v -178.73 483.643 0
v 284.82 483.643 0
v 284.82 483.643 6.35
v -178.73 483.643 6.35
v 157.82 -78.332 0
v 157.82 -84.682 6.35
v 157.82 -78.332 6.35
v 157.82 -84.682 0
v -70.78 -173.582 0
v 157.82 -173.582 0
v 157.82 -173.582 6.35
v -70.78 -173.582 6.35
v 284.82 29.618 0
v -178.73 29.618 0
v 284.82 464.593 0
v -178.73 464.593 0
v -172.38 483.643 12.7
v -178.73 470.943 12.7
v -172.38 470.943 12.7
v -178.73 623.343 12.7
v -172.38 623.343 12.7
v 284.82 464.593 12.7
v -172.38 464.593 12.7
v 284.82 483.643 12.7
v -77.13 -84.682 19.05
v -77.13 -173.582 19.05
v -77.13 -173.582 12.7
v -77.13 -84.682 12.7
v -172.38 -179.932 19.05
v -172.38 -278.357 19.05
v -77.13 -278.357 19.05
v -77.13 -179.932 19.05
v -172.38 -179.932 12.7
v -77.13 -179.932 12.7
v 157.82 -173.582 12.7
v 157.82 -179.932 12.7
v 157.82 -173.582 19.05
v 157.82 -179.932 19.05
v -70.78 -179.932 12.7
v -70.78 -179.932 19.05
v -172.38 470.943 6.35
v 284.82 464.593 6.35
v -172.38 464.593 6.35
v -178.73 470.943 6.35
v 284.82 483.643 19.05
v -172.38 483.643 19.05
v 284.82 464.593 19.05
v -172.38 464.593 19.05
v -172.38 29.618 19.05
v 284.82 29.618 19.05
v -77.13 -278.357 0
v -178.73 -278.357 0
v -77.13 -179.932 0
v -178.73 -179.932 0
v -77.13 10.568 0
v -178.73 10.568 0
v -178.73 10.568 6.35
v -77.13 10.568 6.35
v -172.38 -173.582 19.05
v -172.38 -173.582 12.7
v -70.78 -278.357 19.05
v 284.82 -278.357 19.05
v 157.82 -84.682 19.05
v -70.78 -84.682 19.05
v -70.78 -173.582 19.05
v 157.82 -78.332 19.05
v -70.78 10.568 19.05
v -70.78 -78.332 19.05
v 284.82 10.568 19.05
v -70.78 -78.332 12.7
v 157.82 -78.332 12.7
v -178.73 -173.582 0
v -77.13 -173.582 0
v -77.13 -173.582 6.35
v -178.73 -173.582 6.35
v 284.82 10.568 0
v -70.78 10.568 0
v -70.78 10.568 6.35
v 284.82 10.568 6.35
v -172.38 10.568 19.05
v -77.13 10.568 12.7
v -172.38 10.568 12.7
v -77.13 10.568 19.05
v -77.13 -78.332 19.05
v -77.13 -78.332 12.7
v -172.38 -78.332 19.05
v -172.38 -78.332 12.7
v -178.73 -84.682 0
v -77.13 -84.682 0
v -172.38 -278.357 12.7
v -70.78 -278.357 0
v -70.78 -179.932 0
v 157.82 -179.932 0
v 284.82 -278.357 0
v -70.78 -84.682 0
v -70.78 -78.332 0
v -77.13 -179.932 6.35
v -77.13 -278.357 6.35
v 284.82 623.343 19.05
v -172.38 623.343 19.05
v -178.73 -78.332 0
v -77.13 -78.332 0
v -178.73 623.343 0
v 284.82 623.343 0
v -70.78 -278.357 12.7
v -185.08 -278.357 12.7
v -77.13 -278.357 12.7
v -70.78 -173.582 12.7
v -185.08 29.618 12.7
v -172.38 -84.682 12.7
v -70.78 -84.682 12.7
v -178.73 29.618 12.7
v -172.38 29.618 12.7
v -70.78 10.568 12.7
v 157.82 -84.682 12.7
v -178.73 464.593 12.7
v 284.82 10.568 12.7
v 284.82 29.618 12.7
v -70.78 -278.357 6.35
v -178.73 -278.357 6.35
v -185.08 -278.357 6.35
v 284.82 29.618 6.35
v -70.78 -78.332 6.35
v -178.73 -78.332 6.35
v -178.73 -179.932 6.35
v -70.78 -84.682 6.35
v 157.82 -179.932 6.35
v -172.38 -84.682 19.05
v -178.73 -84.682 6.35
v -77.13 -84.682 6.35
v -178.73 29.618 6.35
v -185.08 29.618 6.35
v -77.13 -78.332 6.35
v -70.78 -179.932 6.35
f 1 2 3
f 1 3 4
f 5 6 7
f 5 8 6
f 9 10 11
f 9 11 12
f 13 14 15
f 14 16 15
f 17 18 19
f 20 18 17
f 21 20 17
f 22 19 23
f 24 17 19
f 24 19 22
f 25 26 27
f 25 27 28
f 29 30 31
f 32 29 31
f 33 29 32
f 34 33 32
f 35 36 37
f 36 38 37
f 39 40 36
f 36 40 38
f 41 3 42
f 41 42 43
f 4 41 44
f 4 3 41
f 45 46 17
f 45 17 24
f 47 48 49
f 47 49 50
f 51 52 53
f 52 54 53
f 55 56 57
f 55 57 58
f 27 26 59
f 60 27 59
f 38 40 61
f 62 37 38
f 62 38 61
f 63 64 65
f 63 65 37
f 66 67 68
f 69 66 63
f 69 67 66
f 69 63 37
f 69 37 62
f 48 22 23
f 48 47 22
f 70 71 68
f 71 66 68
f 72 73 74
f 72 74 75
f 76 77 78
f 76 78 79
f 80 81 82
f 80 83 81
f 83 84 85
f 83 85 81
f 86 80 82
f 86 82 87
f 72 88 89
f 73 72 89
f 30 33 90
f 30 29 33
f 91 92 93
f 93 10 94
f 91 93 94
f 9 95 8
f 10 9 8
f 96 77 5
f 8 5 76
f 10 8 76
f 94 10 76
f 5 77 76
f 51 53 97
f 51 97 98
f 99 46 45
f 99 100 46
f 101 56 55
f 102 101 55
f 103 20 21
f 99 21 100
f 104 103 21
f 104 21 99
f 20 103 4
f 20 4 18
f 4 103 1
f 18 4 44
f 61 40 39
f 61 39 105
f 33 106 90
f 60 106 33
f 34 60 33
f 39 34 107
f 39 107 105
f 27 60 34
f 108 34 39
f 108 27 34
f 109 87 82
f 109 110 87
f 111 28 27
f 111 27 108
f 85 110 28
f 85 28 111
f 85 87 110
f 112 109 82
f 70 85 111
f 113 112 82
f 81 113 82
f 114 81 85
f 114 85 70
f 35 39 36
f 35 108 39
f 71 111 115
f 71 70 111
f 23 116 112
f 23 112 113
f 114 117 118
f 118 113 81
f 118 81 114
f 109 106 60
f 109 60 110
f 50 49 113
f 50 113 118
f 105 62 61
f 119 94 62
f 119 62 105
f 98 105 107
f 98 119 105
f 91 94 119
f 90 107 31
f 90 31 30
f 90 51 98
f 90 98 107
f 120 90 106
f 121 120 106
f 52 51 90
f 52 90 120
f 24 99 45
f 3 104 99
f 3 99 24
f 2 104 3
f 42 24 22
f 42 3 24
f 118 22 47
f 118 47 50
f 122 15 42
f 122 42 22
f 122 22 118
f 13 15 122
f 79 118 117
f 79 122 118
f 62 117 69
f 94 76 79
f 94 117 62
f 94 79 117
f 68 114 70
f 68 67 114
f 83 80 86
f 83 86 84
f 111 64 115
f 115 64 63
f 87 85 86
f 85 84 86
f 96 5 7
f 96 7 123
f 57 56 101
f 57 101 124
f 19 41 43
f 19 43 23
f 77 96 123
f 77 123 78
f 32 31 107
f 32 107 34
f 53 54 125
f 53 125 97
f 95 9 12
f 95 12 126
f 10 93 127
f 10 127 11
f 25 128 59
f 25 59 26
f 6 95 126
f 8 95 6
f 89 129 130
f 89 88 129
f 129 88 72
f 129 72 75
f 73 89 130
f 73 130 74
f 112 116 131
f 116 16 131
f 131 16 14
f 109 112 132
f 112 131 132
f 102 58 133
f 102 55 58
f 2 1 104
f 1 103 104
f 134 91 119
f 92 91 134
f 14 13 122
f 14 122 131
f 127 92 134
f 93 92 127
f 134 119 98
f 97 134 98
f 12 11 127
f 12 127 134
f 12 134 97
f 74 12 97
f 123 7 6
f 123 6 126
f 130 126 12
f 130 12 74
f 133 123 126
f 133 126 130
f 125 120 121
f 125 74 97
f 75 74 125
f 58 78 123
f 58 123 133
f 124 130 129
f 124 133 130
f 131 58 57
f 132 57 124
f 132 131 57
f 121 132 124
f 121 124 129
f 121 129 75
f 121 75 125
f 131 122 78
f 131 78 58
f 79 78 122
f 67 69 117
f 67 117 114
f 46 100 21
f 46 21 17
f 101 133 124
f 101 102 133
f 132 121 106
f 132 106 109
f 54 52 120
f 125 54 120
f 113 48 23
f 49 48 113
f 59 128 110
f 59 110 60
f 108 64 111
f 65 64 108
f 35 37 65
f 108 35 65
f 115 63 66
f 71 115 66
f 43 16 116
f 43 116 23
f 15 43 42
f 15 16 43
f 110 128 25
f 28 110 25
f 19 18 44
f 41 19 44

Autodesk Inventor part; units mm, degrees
ref_plane "YZ Plane" through (0, 0, 0) normal (1, 0, 0) x (0, 1, 0)
ref_plane "XZ Plane" through (0, 0, 0) normal (0, 1, 0) x (-1, 0, 0)
ref_plane "XY Plane" through (0, 0, 0) normal (0, 0, 1) x (1, 0, 0)
sketch "Sketch1" plane through (0, 0, 0) normal (0, 0, 1) x (1, 0, 0)
  line L0 (-185.0798, 623.3432) -> (284.8202, 623.3432)
  line L1 (284.8202, 623.3432) -> (284.8202, -278.3568)
  line L2 (284.8202, -278.3568) -> (-185.0798, -278.3568)
  line L3 (-185.0798, -278.3568) -> (-185.0798, 623.3432)
  point P0 (0, 0)
  dimension "d0" = 901.7
  dimension "d1" = 469.9
extrude "Board" add sketch "Sketch1" along normal blind 19.05
sketch "Sketch6" plane through (0, 0, 0) normal (0, 0, -1) x (-1, 0, 0)
  line L0 (-284.8202, 483.6432) -> (185.0798, 483.6432)
  line L1 (185.0798, 483.6432) -> (185.0798, 464.5932)
  line L2 (185.0798, 464.5932) -> (-284.8202, 464.5932)
  line L3 (-284.8202, 464.5932) -> (-284.8202, 483.6432)
  line L4 (185.0798, 623.3432) -> (-284.8202, 623.3432) projected
  line L5 (185.0798, -278.3568) -> (185.0798, 623.3432) projected
  line L6 (-284.8202, 623.3432) -> (-284.8202, -278.3568) projected
  line L7 (-284.8202, 29.6182) -> (185.0798, 29.6182)
  line L8 (185.0798, 29.6182) -> (185.0798, 10.5682)
  line L9 (185.0798, 10.5682) -> (-284.8202, 10.5682)
  line L10 (-284.8202, 10.5682) -> (-284.8202, 29.6182)
  point P0 (0, 0)
  dimension "d30" = 19.05
  dimension "d37" = 434.975
  dimension "d119" = 139.7
extrude "Right Shelf Dados" cut sketch "Sketch6" against normal blind 6.35 contours L0 L1 L2 L3 | L7 L5 L9 L6
sketch "Sketch32" plane through (0, 0, 0) normal (0, 0, -1) x (-1, 0, 0)
  line L0 (-157.8202, -78.3318) -> (185.0798, -78.3318)
  line L1 (185.0798, -78.3318) -> (185.0798, -84.6818)
  line L2 (185.0798, -84.6818) -> (-157.8202, -84.6818)
  line L3 (-157.8202, -84.6818) -> (-157.8202, -78.3318)
  line L4 (-157.8202, -173.5818) -> (185.0798, -173.5818)
  line L5 (185.0798, -173.5818) -> (185.0798, -179.9318)
  line L6 (185.0798, -179.9318) -> (-157.8202, -179.9318)
  line L7 (-157.8202, -179.9318) -> (-157.8202, -173.5818)
  line L8 (-284.8202, 623.3432) -> (-284.8202, -278.3568) projected
  line L9 (185.0798, 623.3432) -> (185.0798, -278.3568) projected
  line L10 (-284.8202, -278.3568) -> (185.0798, -278.3568) projected
  point P0 (0, 0)
  point P1 (-284.8202, 10.5682)
  dimension "d142" = 88.9
  dimension "d143" = 6.35
  dimension "d146" = 342.9
  dimension "d167" = 127
  dimension "d170" = 98.425
extrude "Right Wine Rack Horizonal Dados" cut sketch "Sketch32" against normal blind 6.35
sketch "Sketch33" plane through (0, 0, 0) normal (0, 0, -1) x (-1, 0, 0)
  line L0 (185.0798, 10.5682) -> (-284.8202, 10.5682) projected
  line L1 (70.7798, 10.5682) -> (77.1298, 10.5682)
  line L2 (77.1298, 10.5682) -> (77.1298, -278.3568)
  line L3 (77.1298, -278.3568) -> (70.7798, -278.3568)
  line L4 (70.7798, -278.3568) -> (70.7798, 10.5682)
  line L5 (-157.8202, -84.6818) -> (-157.8202, -78.3318) projected
  line L6 (-284.8202, -278.3568) -> (185.0798, -278.3568) projected
  point P0 (0, 0)
  dimension "d149" = 6.35
  dimension "d168" = 228.6
extrude "Right Wine Rack Vertical Dado" cut sketch "Sketch33" against normal blind 6.35
sketch "Sketch7" plane through (0, 0, 19.05) normal (0, 0, 1) x (1, 0, 0)
  line L0 (-185.0798, 483.6432) -> (284.8202, 483.6432)
  line L1 (284.8202, 483.6432) -> (284.8202, 464.5932)
  line L2 (284.8202, 464.5932) -> (-185.0798, 464.5932)
  line L3 (-185.0798, 464.5932) -> (-185.0798, 483.6432)
  line L4 (284.8202, 483.6432) -> (-185.0798, 483.6432) projected
  line L5 (-185.0798, 464.5932) -> (284.8202, 464.5932) projected
  line L6 (284.8202, -278.3568) -> (284.8202, 623.3432) projected
  line L7 (-185.0798, 623.3432) -> (-185.0798, -278.3568) projected
  line L8 (-185.0798, 29.6182) -> (284.8202, 29.6182)
  line L9 (284.8202, 29.6182) -> (284.8202, 10.5682)
  line L10 (284.8202, 10.5682) -> (-185.0798, 10.5682)
  line L11 (-185.0798, 10.5682) -> (-185.0798, 29.6182)
  point P0 (0, 0)
  point P1 (284.8202, 20.0932)
  dimension "d36" = 434.975
extrude "Left Shelf Dados" cut sketch "Sketch7" against normal blind 6.35 contours L0 L1 L2 L3 | L8 L6 L10 L7
sketch "Sketch34" plane through (0, 0, 19.05) normal (0, 0, 1) x (1, 0, 0)
  line L0 (157.8202, -78.3318) -> (-185.0798, -78.3318)
  line L1 (-185.0798, -78.3318) -> (-185.0798, -84.6818)
  line L2 (-185.0798, -84.6818) -> (157.8202, -84.6818)
  line L3 (157.8202, -84.6818) -> (157.8202, -78.3318)
  line L4 (157.8202, -173.5818) -> (-185.0798, -173.5818)
  line L5 (-185.0798, -173.5818) -> (-185.0798, -179.9318)
  line L6 (-185.0798, -179.9318) -> (157.8202, -179.9318)
  line L7 (157.8202, -179.9318) -> (157.8202, -173.5818)
  line L8 (284.8202, -278.3568) -> (284.8202, 10.5682) projected
  line L9 (-185.0798, 10.5682) -> (-185.0798, 483.6432) projected
  line L10 (-185.0798, -278.3568) -> (284.8202, -278.3568) projected
  point P0 (0, 0)
  dimension "d153" = 6.35
  dimension "d155" = 88.9
  dimension "d164" = 127
  dimension "d171" = 98.425
extrude "Left Wine Rack Horizontal Dados" cut sketch "Sketch34" against normal blind 6.35
sketch "Sketch35" plane through (0, 0, 19.05) normal (0, 0, 1) x (1, 0, 0)
  line L0 (284.8202, 10.5682) -> (-185.0798, 10.5682) projected
  line L1 (-77.1298, 10.5682) -> (-70.7798, 10.5682)
  line L2 (-70.7798, 10.5682) -> (-70.7798, -278.3568)
  line L3 (-70.7798, -278.3568) -> (-77.1298, -278.3568)
  line L4 (-77.1298, -278.3568) -> (-77.1298, 10.5682)
  line L5 (157.8202, -78.3318) -> (157.8202, -84.6818) projected
  line L6 (-185.0798, -278.3568) -> (284.8202, -278.3568) projected
  point P0 (0, 0)
  dimension "d159" = 6.35
  dimension "d165" = 228.6
extrude "Left Wine Rack  Vertical Dado" cut sketch "Sketch35" against normal blind 6.35
sketch "Sketch10" plane through (0, 0, 19.05) normal (0, 0, 1) x (1, 0, 0)
  line L0 (284.8202, -278.3568) -> (-185.0798, -278.3568) projected
  line L1 (-185.0798, 623.3432) -> (-172.3798, 623.3432)
  line L2 (-172.3798, 623.3432) -> (-172.3798, -278.3568)
  line L3 (-172.3798, -278.3568) -> (-185.0798, -278.3568)
  line L4 (-185.0798, -278.3568) -> (-185.0798, 623.3432)
  point P0 (0, 0)
  point P1 (-77.1298, -278.3568)
  dimension "d48" = 12.7
extrude "Vertical Wire Channel" cut sketch "Sketch10" against normal blind 6.35
sketch "Sketch12" plane through (-185.0798, -278.3568, 12.7) normal (-1, 0, 0) x (0, 0, 1)
  line L0 (-6.35, 742.95) -> (0, 742.95)
  line L1 (0, 742.95) -> (0, 749.3)
  line L2 (0, 749.3) -> (-6.35, 749.3)
  line L3 (-6.35, 749.3) -> (-6.35, 742.95)
  line L4 (0, 0) -> (0, 901.7) projected
  line L5 (-6.35, 742.95) -> (-12.7, 742.95) projected
  dimension "d51" = 6.35
extrude "Top Horizontal Wire Channel" cut sketch "Sketch12" against normal blind 12.7
sketch "Sketch20" plane through (0, 0, 0) normal (0, 0, -1) x (-1, 0, 0)
  line L0 (185.0798, 623.3432) -> (-284.8202, 623.3432) projected
  line L1 (-284.8202, 29.6182) -> (185.0798, 29.6182) projected
  line L2 (185.0798, 623.3432) -> (178.7298, 623.3432)
  line L3 (178.7298, 623.3432) -> (178.7298, 29.6182)
  line L4 (178.7298, 29.6182) -> (185.0798, 29.6182)
  line L5 (185.0798, 29.6182) -> (185.0798, 623.3432)
  point P0 (0, 0)
  dimension "d99" = 6.35
extrude "Rear Top Panel Dado" cut sketch "Sketch20" against normal blind 12.7
sketch "Sketch21" plane through (-185.0798, -278.3568, 0) normal (-1, 0, 0) x (0, 0, 1)
  line L0 (0, 200.025) -> (0, 288.925) projected
  line L1 (0, 288.925) -> (6.35, 288.925)
  line L2 (6.35, 288.925) -> (6.35, 0)
  line L3 (0, 0) -> (0, 288.925)
  line L4 (0, 0) -> (6.35, 0)
  line L5 (0, 0) -> (12.7, 0) projected
extrude "Bottom Panel Dado" cut sketch "Sketch21" against normal blind 6.35
properties part number "Vertical Shelf cut short (2.3.2018)"
